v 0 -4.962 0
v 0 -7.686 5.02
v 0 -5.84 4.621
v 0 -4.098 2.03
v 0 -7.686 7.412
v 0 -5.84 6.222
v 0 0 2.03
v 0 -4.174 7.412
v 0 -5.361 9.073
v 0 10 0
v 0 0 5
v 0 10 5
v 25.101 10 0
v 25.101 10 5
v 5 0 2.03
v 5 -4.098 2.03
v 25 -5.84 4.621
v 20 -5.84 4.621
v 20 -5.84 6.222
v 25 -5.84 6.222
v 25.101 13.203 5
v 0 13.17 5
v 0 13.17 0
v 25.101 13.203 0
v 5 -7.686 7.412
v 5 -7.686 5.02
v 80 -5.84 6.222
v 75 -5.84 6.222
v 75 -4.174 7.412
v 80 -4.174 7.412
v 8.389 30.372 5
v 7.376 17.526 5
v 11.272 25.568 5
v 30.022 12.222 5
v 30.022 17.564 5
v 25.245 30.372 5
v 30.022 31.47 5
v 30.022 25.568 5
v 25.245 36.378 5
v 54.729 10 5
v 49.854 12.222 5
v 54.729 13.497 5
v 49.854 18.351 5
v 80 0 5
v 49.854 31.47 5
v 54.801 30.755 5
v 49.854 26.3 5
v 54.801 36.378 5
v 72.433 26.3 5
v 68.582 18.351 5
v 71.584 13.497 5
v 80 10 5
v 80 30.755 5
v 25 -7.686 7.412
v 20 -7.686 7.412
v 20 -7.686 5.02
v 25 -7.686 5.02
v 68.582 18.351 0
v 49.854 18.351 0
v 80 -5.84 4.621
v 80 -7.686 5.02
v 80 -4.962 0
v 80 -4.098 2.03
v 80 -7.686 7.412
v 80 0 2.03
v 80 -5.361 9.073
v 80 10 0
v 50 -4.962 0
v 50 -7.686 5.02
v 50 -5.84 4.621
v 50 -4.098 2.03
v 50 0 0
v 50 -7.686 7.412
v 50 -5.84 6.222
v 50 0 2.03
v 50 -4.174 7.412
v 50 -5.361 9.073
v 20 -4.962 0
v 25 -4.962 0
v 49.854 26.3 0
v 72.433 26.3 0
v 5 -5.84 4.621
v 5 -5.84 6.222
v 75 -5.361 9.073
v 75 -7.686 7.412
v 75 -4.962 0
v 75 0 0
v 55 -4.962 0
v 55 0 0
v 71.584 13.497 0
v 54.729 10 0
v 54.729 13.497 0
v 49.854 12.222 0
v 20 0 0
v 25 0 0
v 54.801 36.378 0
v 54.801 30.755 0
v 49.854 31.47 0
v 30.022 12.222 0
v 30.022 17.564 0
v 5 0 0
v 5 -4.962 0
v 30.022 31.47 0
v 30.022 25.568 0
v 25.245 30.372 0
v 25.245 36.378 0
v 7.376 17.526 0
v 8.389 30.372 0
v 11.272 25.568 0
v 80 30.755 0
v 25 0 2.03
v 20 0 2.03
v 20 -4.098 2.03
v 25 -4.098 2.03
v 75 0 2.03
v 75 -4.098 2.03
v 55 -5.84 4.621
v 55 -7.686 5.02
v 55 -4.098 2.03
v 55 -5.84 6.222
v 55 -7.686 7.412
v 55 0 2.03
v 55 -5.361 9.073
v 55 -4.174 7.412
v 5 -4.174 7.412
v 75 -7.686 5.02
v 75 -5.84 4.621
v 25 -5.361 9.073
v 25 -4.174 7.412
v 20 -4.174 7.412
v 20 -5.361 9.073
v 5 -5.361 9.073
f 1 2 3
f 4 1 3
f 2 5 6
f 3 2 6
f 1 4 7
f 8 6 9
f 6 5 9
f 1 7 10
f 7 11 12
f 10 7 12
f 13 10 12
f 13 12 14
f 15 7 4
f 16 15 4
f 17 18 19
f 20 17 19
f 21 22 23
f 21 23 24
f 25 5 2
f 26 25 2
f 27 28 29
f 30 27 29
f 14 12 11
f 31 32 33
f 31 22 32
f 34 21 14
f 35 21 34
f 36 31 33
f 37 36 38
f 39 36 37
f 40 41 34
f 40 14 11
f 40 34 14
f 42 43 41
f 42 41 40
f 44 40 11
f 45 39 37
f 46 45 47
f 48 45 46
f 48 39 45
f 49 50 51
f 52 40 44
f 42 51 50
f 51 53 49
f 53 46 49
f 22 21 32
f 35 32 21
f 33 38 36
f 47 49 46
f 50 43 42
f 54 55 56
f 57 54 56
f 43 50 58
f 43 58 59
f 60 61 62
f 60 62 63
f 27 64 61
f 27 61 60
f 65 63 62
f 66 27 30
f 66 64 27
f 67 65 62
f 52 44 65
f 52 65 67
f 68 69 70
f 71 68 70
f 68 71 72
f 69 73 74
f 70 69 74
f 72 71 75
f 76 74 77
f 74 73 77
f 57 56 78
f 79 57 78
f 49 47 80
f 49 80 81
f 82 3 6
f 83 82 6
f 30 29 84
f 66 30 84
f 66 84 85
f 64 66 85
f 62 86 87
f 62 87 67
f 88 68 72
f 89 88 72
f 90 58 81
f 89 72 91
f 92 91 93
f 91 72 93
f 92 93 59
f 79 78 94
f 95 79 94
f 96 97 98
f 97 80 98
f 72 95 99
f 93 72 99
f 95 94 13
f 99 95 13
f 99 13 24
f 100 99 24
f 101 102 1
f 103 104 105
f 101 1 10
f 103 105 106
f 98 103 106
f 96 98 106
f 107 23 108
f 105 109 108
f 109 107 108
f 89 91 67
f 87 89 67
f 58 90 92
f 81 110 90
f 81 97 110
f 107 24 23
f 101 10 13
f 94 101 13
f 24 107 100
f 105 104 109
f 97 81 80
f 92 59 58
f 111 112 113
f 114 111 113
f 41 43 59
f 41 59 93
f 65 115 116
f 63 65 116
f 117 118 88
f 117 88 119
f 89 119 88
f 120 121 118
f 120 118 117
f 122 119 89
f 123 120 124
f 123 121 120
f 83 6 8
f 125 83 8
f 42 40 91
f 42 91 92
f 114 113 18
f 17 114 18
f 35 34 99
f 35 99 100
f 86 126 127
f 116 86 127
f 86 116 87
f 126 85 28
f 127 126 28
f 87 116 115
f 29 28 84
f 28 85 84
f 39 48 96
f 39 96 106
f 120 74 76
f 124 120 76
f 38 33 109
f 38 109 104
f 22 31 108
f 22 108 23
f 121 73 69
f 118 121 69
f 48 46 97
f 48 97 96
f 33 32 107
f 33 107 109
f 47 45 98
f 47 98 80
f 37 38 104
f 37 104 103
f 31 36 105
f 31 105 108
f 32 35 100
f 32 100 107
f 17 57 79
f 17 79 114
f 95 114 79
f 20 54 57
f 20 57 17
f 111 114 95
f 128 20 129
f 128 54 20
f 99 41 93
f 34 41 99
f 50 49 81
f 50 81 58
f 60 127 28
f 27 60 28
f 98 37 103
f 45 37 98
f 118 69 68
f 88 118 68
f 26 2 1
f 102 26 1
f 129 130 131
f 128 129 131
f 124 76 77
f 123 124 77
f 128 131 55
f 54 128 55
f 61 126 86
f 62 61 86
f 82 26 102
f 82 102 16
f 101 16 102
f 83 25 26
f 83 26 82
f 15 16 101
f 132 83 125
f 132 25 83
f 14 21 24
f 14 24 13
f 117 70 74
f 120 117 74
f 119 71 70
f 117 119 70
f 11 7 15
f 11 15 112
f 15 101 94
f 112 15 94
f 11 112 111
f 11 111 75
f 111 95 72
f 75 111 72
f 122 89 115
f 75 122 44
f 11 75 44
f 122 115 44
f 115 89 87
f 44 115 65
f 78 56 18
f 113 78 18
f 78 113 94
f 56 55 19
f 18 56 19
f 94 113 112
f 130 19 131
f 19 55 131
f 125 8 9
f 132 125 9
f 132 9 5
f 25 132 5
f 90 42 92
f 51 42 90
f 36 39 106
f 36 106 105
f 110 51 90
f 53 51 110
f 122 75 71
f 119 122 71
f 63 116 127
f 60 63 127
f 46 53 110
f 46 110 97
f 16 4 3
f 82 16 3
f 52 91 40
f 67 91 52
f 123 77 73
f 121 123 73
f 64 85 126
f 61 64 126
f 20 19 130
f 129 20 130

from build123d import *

# Parameters (mm, degrees)
F0_W      = 80
F0_H      = 10
F1_DEPTH  = 5
F3_DEPTH  = 5
F6_DEPTH  = 5
F9_DEPTH  = 5
F12_DEPTH = 5
F14_DEPTH = 5


with BuildPart() as f1:
    # F0 (on Top) → F1 (new body)
    with BuildSketch(Plane.XY):
        with Locations((40, 5)):
            Rectangle(F0_W, F0_H)
    extrude(amount=F1_DEPTH)

    # F2 (on Right) → F3 (join)
    with BuildSketch(Plane.YZ):
        Polygon((-4.9618040211, 0), (0, 0), (0, 2.0297223236), (-4.097959958, 2.0297223236), (-5.8396296574, 4.6212524176), (-5.8396296574, 6.2223259127), (-4.17390365, 7.4121300131), (-5.360500887, 9.073366411), (-7.6862322167, 7.4121300131), (-7.6862322167, 5.0199492835), align=None)
    extrude(amount=F3_DEPTH)

    # F5 (on offset) → F6 (join)
    with BuildSketch(Plane.YZ.offset(20)):
        Polygon((-4.9618040211, 0), (0, 0), (0, 2.0297223236), (-4.097959958, 2.0297223236), (-5.8396296574, 4.6212524176), (-5.8396296574, 6.2223259127), (-4.17390365, 7.4121300131), (-5.360500887, 9.073366411), (-7.6862322167, 7.4121300131), (-7.6862322167, 5.0199492835), align=None)
    extrude(amount=F6_DEPTH)

    # F8 (on offset) → F9 (join)
    with BuildSketch(Plane.YZ.offset(50)):
        Polygon((-5.360500887, 9.073366411), (-7.6862322167, 7.4121300131), (-7.6862322167, 5.0199492835), (-4.9618040211, 0), (0, 0), (0, 2.0297223236), (-4.097959958, 2.0297223236), (-5.8396296574, 4.6212524176), (-5.8396296574, 6.2223259127), (-4.17390365, 7.4121300131), align=None)
    extrude(amount=F9_DEPTH)

    # F11 (on offset) → F12 (join)
    with BuildSketch(Plane.YZ.offset(75)):
        Polygon((-5.8396296574, 6.2223259127), (-4.17390365, 7.4121300131), (-5.360500887, 9.073366411), (-7.6862322167, 7.4121300131), (-7.6862322167, 5.0199492835), (-4.9618040211, 0), (0, 0), (0, 2.0297223236), (-4.097959958, 2.0297223236), (-5.8396296574, 4.6212524176), align=None)
    extrude(amount=F12_DEPTH)

    # F13 (on face) → F14 (join)
    with BuildSketch(Plane.XY.offset(5)):
        Polygon((8.3886766806, 30.3718596697), (0, 13.1700793281), (25.1010470092, 13.2027473301), (25.1010470092, 10), (54.7285676003, 10), (54.7285676003, 13.4966513142), (71.5840160847, 13.4966513142), (80, 30.7553019375), (54.801363498, 30.7553019375), (54.801363498, 36.3780027509), (25.2450443804, 36.3780027509), (25.2450443804, 30.3718596697), align=None)
        Polygon((30.0217233598, 17.5636745989), (7.3759490624, 17.5260230899), (11.2720150501, 25.5676303059), (30.0217233598, 25.5676303059), (30.0217233598, 31.4697995782), (49.8536489904, 31.4697995782), (49.8536489904, 26.3000894338), (72.4333301187, 26.3000894338), (68.5819346344, 18.350683593), (49.8536489904, 18.350683593), (49.8536489904, 12.2224157676), (30.0217233598, 12.2224157676), align=None, mode=Mode.SUBTRACT)
    extrude(amount=-F14_DEPTH)


solid = f1.part
